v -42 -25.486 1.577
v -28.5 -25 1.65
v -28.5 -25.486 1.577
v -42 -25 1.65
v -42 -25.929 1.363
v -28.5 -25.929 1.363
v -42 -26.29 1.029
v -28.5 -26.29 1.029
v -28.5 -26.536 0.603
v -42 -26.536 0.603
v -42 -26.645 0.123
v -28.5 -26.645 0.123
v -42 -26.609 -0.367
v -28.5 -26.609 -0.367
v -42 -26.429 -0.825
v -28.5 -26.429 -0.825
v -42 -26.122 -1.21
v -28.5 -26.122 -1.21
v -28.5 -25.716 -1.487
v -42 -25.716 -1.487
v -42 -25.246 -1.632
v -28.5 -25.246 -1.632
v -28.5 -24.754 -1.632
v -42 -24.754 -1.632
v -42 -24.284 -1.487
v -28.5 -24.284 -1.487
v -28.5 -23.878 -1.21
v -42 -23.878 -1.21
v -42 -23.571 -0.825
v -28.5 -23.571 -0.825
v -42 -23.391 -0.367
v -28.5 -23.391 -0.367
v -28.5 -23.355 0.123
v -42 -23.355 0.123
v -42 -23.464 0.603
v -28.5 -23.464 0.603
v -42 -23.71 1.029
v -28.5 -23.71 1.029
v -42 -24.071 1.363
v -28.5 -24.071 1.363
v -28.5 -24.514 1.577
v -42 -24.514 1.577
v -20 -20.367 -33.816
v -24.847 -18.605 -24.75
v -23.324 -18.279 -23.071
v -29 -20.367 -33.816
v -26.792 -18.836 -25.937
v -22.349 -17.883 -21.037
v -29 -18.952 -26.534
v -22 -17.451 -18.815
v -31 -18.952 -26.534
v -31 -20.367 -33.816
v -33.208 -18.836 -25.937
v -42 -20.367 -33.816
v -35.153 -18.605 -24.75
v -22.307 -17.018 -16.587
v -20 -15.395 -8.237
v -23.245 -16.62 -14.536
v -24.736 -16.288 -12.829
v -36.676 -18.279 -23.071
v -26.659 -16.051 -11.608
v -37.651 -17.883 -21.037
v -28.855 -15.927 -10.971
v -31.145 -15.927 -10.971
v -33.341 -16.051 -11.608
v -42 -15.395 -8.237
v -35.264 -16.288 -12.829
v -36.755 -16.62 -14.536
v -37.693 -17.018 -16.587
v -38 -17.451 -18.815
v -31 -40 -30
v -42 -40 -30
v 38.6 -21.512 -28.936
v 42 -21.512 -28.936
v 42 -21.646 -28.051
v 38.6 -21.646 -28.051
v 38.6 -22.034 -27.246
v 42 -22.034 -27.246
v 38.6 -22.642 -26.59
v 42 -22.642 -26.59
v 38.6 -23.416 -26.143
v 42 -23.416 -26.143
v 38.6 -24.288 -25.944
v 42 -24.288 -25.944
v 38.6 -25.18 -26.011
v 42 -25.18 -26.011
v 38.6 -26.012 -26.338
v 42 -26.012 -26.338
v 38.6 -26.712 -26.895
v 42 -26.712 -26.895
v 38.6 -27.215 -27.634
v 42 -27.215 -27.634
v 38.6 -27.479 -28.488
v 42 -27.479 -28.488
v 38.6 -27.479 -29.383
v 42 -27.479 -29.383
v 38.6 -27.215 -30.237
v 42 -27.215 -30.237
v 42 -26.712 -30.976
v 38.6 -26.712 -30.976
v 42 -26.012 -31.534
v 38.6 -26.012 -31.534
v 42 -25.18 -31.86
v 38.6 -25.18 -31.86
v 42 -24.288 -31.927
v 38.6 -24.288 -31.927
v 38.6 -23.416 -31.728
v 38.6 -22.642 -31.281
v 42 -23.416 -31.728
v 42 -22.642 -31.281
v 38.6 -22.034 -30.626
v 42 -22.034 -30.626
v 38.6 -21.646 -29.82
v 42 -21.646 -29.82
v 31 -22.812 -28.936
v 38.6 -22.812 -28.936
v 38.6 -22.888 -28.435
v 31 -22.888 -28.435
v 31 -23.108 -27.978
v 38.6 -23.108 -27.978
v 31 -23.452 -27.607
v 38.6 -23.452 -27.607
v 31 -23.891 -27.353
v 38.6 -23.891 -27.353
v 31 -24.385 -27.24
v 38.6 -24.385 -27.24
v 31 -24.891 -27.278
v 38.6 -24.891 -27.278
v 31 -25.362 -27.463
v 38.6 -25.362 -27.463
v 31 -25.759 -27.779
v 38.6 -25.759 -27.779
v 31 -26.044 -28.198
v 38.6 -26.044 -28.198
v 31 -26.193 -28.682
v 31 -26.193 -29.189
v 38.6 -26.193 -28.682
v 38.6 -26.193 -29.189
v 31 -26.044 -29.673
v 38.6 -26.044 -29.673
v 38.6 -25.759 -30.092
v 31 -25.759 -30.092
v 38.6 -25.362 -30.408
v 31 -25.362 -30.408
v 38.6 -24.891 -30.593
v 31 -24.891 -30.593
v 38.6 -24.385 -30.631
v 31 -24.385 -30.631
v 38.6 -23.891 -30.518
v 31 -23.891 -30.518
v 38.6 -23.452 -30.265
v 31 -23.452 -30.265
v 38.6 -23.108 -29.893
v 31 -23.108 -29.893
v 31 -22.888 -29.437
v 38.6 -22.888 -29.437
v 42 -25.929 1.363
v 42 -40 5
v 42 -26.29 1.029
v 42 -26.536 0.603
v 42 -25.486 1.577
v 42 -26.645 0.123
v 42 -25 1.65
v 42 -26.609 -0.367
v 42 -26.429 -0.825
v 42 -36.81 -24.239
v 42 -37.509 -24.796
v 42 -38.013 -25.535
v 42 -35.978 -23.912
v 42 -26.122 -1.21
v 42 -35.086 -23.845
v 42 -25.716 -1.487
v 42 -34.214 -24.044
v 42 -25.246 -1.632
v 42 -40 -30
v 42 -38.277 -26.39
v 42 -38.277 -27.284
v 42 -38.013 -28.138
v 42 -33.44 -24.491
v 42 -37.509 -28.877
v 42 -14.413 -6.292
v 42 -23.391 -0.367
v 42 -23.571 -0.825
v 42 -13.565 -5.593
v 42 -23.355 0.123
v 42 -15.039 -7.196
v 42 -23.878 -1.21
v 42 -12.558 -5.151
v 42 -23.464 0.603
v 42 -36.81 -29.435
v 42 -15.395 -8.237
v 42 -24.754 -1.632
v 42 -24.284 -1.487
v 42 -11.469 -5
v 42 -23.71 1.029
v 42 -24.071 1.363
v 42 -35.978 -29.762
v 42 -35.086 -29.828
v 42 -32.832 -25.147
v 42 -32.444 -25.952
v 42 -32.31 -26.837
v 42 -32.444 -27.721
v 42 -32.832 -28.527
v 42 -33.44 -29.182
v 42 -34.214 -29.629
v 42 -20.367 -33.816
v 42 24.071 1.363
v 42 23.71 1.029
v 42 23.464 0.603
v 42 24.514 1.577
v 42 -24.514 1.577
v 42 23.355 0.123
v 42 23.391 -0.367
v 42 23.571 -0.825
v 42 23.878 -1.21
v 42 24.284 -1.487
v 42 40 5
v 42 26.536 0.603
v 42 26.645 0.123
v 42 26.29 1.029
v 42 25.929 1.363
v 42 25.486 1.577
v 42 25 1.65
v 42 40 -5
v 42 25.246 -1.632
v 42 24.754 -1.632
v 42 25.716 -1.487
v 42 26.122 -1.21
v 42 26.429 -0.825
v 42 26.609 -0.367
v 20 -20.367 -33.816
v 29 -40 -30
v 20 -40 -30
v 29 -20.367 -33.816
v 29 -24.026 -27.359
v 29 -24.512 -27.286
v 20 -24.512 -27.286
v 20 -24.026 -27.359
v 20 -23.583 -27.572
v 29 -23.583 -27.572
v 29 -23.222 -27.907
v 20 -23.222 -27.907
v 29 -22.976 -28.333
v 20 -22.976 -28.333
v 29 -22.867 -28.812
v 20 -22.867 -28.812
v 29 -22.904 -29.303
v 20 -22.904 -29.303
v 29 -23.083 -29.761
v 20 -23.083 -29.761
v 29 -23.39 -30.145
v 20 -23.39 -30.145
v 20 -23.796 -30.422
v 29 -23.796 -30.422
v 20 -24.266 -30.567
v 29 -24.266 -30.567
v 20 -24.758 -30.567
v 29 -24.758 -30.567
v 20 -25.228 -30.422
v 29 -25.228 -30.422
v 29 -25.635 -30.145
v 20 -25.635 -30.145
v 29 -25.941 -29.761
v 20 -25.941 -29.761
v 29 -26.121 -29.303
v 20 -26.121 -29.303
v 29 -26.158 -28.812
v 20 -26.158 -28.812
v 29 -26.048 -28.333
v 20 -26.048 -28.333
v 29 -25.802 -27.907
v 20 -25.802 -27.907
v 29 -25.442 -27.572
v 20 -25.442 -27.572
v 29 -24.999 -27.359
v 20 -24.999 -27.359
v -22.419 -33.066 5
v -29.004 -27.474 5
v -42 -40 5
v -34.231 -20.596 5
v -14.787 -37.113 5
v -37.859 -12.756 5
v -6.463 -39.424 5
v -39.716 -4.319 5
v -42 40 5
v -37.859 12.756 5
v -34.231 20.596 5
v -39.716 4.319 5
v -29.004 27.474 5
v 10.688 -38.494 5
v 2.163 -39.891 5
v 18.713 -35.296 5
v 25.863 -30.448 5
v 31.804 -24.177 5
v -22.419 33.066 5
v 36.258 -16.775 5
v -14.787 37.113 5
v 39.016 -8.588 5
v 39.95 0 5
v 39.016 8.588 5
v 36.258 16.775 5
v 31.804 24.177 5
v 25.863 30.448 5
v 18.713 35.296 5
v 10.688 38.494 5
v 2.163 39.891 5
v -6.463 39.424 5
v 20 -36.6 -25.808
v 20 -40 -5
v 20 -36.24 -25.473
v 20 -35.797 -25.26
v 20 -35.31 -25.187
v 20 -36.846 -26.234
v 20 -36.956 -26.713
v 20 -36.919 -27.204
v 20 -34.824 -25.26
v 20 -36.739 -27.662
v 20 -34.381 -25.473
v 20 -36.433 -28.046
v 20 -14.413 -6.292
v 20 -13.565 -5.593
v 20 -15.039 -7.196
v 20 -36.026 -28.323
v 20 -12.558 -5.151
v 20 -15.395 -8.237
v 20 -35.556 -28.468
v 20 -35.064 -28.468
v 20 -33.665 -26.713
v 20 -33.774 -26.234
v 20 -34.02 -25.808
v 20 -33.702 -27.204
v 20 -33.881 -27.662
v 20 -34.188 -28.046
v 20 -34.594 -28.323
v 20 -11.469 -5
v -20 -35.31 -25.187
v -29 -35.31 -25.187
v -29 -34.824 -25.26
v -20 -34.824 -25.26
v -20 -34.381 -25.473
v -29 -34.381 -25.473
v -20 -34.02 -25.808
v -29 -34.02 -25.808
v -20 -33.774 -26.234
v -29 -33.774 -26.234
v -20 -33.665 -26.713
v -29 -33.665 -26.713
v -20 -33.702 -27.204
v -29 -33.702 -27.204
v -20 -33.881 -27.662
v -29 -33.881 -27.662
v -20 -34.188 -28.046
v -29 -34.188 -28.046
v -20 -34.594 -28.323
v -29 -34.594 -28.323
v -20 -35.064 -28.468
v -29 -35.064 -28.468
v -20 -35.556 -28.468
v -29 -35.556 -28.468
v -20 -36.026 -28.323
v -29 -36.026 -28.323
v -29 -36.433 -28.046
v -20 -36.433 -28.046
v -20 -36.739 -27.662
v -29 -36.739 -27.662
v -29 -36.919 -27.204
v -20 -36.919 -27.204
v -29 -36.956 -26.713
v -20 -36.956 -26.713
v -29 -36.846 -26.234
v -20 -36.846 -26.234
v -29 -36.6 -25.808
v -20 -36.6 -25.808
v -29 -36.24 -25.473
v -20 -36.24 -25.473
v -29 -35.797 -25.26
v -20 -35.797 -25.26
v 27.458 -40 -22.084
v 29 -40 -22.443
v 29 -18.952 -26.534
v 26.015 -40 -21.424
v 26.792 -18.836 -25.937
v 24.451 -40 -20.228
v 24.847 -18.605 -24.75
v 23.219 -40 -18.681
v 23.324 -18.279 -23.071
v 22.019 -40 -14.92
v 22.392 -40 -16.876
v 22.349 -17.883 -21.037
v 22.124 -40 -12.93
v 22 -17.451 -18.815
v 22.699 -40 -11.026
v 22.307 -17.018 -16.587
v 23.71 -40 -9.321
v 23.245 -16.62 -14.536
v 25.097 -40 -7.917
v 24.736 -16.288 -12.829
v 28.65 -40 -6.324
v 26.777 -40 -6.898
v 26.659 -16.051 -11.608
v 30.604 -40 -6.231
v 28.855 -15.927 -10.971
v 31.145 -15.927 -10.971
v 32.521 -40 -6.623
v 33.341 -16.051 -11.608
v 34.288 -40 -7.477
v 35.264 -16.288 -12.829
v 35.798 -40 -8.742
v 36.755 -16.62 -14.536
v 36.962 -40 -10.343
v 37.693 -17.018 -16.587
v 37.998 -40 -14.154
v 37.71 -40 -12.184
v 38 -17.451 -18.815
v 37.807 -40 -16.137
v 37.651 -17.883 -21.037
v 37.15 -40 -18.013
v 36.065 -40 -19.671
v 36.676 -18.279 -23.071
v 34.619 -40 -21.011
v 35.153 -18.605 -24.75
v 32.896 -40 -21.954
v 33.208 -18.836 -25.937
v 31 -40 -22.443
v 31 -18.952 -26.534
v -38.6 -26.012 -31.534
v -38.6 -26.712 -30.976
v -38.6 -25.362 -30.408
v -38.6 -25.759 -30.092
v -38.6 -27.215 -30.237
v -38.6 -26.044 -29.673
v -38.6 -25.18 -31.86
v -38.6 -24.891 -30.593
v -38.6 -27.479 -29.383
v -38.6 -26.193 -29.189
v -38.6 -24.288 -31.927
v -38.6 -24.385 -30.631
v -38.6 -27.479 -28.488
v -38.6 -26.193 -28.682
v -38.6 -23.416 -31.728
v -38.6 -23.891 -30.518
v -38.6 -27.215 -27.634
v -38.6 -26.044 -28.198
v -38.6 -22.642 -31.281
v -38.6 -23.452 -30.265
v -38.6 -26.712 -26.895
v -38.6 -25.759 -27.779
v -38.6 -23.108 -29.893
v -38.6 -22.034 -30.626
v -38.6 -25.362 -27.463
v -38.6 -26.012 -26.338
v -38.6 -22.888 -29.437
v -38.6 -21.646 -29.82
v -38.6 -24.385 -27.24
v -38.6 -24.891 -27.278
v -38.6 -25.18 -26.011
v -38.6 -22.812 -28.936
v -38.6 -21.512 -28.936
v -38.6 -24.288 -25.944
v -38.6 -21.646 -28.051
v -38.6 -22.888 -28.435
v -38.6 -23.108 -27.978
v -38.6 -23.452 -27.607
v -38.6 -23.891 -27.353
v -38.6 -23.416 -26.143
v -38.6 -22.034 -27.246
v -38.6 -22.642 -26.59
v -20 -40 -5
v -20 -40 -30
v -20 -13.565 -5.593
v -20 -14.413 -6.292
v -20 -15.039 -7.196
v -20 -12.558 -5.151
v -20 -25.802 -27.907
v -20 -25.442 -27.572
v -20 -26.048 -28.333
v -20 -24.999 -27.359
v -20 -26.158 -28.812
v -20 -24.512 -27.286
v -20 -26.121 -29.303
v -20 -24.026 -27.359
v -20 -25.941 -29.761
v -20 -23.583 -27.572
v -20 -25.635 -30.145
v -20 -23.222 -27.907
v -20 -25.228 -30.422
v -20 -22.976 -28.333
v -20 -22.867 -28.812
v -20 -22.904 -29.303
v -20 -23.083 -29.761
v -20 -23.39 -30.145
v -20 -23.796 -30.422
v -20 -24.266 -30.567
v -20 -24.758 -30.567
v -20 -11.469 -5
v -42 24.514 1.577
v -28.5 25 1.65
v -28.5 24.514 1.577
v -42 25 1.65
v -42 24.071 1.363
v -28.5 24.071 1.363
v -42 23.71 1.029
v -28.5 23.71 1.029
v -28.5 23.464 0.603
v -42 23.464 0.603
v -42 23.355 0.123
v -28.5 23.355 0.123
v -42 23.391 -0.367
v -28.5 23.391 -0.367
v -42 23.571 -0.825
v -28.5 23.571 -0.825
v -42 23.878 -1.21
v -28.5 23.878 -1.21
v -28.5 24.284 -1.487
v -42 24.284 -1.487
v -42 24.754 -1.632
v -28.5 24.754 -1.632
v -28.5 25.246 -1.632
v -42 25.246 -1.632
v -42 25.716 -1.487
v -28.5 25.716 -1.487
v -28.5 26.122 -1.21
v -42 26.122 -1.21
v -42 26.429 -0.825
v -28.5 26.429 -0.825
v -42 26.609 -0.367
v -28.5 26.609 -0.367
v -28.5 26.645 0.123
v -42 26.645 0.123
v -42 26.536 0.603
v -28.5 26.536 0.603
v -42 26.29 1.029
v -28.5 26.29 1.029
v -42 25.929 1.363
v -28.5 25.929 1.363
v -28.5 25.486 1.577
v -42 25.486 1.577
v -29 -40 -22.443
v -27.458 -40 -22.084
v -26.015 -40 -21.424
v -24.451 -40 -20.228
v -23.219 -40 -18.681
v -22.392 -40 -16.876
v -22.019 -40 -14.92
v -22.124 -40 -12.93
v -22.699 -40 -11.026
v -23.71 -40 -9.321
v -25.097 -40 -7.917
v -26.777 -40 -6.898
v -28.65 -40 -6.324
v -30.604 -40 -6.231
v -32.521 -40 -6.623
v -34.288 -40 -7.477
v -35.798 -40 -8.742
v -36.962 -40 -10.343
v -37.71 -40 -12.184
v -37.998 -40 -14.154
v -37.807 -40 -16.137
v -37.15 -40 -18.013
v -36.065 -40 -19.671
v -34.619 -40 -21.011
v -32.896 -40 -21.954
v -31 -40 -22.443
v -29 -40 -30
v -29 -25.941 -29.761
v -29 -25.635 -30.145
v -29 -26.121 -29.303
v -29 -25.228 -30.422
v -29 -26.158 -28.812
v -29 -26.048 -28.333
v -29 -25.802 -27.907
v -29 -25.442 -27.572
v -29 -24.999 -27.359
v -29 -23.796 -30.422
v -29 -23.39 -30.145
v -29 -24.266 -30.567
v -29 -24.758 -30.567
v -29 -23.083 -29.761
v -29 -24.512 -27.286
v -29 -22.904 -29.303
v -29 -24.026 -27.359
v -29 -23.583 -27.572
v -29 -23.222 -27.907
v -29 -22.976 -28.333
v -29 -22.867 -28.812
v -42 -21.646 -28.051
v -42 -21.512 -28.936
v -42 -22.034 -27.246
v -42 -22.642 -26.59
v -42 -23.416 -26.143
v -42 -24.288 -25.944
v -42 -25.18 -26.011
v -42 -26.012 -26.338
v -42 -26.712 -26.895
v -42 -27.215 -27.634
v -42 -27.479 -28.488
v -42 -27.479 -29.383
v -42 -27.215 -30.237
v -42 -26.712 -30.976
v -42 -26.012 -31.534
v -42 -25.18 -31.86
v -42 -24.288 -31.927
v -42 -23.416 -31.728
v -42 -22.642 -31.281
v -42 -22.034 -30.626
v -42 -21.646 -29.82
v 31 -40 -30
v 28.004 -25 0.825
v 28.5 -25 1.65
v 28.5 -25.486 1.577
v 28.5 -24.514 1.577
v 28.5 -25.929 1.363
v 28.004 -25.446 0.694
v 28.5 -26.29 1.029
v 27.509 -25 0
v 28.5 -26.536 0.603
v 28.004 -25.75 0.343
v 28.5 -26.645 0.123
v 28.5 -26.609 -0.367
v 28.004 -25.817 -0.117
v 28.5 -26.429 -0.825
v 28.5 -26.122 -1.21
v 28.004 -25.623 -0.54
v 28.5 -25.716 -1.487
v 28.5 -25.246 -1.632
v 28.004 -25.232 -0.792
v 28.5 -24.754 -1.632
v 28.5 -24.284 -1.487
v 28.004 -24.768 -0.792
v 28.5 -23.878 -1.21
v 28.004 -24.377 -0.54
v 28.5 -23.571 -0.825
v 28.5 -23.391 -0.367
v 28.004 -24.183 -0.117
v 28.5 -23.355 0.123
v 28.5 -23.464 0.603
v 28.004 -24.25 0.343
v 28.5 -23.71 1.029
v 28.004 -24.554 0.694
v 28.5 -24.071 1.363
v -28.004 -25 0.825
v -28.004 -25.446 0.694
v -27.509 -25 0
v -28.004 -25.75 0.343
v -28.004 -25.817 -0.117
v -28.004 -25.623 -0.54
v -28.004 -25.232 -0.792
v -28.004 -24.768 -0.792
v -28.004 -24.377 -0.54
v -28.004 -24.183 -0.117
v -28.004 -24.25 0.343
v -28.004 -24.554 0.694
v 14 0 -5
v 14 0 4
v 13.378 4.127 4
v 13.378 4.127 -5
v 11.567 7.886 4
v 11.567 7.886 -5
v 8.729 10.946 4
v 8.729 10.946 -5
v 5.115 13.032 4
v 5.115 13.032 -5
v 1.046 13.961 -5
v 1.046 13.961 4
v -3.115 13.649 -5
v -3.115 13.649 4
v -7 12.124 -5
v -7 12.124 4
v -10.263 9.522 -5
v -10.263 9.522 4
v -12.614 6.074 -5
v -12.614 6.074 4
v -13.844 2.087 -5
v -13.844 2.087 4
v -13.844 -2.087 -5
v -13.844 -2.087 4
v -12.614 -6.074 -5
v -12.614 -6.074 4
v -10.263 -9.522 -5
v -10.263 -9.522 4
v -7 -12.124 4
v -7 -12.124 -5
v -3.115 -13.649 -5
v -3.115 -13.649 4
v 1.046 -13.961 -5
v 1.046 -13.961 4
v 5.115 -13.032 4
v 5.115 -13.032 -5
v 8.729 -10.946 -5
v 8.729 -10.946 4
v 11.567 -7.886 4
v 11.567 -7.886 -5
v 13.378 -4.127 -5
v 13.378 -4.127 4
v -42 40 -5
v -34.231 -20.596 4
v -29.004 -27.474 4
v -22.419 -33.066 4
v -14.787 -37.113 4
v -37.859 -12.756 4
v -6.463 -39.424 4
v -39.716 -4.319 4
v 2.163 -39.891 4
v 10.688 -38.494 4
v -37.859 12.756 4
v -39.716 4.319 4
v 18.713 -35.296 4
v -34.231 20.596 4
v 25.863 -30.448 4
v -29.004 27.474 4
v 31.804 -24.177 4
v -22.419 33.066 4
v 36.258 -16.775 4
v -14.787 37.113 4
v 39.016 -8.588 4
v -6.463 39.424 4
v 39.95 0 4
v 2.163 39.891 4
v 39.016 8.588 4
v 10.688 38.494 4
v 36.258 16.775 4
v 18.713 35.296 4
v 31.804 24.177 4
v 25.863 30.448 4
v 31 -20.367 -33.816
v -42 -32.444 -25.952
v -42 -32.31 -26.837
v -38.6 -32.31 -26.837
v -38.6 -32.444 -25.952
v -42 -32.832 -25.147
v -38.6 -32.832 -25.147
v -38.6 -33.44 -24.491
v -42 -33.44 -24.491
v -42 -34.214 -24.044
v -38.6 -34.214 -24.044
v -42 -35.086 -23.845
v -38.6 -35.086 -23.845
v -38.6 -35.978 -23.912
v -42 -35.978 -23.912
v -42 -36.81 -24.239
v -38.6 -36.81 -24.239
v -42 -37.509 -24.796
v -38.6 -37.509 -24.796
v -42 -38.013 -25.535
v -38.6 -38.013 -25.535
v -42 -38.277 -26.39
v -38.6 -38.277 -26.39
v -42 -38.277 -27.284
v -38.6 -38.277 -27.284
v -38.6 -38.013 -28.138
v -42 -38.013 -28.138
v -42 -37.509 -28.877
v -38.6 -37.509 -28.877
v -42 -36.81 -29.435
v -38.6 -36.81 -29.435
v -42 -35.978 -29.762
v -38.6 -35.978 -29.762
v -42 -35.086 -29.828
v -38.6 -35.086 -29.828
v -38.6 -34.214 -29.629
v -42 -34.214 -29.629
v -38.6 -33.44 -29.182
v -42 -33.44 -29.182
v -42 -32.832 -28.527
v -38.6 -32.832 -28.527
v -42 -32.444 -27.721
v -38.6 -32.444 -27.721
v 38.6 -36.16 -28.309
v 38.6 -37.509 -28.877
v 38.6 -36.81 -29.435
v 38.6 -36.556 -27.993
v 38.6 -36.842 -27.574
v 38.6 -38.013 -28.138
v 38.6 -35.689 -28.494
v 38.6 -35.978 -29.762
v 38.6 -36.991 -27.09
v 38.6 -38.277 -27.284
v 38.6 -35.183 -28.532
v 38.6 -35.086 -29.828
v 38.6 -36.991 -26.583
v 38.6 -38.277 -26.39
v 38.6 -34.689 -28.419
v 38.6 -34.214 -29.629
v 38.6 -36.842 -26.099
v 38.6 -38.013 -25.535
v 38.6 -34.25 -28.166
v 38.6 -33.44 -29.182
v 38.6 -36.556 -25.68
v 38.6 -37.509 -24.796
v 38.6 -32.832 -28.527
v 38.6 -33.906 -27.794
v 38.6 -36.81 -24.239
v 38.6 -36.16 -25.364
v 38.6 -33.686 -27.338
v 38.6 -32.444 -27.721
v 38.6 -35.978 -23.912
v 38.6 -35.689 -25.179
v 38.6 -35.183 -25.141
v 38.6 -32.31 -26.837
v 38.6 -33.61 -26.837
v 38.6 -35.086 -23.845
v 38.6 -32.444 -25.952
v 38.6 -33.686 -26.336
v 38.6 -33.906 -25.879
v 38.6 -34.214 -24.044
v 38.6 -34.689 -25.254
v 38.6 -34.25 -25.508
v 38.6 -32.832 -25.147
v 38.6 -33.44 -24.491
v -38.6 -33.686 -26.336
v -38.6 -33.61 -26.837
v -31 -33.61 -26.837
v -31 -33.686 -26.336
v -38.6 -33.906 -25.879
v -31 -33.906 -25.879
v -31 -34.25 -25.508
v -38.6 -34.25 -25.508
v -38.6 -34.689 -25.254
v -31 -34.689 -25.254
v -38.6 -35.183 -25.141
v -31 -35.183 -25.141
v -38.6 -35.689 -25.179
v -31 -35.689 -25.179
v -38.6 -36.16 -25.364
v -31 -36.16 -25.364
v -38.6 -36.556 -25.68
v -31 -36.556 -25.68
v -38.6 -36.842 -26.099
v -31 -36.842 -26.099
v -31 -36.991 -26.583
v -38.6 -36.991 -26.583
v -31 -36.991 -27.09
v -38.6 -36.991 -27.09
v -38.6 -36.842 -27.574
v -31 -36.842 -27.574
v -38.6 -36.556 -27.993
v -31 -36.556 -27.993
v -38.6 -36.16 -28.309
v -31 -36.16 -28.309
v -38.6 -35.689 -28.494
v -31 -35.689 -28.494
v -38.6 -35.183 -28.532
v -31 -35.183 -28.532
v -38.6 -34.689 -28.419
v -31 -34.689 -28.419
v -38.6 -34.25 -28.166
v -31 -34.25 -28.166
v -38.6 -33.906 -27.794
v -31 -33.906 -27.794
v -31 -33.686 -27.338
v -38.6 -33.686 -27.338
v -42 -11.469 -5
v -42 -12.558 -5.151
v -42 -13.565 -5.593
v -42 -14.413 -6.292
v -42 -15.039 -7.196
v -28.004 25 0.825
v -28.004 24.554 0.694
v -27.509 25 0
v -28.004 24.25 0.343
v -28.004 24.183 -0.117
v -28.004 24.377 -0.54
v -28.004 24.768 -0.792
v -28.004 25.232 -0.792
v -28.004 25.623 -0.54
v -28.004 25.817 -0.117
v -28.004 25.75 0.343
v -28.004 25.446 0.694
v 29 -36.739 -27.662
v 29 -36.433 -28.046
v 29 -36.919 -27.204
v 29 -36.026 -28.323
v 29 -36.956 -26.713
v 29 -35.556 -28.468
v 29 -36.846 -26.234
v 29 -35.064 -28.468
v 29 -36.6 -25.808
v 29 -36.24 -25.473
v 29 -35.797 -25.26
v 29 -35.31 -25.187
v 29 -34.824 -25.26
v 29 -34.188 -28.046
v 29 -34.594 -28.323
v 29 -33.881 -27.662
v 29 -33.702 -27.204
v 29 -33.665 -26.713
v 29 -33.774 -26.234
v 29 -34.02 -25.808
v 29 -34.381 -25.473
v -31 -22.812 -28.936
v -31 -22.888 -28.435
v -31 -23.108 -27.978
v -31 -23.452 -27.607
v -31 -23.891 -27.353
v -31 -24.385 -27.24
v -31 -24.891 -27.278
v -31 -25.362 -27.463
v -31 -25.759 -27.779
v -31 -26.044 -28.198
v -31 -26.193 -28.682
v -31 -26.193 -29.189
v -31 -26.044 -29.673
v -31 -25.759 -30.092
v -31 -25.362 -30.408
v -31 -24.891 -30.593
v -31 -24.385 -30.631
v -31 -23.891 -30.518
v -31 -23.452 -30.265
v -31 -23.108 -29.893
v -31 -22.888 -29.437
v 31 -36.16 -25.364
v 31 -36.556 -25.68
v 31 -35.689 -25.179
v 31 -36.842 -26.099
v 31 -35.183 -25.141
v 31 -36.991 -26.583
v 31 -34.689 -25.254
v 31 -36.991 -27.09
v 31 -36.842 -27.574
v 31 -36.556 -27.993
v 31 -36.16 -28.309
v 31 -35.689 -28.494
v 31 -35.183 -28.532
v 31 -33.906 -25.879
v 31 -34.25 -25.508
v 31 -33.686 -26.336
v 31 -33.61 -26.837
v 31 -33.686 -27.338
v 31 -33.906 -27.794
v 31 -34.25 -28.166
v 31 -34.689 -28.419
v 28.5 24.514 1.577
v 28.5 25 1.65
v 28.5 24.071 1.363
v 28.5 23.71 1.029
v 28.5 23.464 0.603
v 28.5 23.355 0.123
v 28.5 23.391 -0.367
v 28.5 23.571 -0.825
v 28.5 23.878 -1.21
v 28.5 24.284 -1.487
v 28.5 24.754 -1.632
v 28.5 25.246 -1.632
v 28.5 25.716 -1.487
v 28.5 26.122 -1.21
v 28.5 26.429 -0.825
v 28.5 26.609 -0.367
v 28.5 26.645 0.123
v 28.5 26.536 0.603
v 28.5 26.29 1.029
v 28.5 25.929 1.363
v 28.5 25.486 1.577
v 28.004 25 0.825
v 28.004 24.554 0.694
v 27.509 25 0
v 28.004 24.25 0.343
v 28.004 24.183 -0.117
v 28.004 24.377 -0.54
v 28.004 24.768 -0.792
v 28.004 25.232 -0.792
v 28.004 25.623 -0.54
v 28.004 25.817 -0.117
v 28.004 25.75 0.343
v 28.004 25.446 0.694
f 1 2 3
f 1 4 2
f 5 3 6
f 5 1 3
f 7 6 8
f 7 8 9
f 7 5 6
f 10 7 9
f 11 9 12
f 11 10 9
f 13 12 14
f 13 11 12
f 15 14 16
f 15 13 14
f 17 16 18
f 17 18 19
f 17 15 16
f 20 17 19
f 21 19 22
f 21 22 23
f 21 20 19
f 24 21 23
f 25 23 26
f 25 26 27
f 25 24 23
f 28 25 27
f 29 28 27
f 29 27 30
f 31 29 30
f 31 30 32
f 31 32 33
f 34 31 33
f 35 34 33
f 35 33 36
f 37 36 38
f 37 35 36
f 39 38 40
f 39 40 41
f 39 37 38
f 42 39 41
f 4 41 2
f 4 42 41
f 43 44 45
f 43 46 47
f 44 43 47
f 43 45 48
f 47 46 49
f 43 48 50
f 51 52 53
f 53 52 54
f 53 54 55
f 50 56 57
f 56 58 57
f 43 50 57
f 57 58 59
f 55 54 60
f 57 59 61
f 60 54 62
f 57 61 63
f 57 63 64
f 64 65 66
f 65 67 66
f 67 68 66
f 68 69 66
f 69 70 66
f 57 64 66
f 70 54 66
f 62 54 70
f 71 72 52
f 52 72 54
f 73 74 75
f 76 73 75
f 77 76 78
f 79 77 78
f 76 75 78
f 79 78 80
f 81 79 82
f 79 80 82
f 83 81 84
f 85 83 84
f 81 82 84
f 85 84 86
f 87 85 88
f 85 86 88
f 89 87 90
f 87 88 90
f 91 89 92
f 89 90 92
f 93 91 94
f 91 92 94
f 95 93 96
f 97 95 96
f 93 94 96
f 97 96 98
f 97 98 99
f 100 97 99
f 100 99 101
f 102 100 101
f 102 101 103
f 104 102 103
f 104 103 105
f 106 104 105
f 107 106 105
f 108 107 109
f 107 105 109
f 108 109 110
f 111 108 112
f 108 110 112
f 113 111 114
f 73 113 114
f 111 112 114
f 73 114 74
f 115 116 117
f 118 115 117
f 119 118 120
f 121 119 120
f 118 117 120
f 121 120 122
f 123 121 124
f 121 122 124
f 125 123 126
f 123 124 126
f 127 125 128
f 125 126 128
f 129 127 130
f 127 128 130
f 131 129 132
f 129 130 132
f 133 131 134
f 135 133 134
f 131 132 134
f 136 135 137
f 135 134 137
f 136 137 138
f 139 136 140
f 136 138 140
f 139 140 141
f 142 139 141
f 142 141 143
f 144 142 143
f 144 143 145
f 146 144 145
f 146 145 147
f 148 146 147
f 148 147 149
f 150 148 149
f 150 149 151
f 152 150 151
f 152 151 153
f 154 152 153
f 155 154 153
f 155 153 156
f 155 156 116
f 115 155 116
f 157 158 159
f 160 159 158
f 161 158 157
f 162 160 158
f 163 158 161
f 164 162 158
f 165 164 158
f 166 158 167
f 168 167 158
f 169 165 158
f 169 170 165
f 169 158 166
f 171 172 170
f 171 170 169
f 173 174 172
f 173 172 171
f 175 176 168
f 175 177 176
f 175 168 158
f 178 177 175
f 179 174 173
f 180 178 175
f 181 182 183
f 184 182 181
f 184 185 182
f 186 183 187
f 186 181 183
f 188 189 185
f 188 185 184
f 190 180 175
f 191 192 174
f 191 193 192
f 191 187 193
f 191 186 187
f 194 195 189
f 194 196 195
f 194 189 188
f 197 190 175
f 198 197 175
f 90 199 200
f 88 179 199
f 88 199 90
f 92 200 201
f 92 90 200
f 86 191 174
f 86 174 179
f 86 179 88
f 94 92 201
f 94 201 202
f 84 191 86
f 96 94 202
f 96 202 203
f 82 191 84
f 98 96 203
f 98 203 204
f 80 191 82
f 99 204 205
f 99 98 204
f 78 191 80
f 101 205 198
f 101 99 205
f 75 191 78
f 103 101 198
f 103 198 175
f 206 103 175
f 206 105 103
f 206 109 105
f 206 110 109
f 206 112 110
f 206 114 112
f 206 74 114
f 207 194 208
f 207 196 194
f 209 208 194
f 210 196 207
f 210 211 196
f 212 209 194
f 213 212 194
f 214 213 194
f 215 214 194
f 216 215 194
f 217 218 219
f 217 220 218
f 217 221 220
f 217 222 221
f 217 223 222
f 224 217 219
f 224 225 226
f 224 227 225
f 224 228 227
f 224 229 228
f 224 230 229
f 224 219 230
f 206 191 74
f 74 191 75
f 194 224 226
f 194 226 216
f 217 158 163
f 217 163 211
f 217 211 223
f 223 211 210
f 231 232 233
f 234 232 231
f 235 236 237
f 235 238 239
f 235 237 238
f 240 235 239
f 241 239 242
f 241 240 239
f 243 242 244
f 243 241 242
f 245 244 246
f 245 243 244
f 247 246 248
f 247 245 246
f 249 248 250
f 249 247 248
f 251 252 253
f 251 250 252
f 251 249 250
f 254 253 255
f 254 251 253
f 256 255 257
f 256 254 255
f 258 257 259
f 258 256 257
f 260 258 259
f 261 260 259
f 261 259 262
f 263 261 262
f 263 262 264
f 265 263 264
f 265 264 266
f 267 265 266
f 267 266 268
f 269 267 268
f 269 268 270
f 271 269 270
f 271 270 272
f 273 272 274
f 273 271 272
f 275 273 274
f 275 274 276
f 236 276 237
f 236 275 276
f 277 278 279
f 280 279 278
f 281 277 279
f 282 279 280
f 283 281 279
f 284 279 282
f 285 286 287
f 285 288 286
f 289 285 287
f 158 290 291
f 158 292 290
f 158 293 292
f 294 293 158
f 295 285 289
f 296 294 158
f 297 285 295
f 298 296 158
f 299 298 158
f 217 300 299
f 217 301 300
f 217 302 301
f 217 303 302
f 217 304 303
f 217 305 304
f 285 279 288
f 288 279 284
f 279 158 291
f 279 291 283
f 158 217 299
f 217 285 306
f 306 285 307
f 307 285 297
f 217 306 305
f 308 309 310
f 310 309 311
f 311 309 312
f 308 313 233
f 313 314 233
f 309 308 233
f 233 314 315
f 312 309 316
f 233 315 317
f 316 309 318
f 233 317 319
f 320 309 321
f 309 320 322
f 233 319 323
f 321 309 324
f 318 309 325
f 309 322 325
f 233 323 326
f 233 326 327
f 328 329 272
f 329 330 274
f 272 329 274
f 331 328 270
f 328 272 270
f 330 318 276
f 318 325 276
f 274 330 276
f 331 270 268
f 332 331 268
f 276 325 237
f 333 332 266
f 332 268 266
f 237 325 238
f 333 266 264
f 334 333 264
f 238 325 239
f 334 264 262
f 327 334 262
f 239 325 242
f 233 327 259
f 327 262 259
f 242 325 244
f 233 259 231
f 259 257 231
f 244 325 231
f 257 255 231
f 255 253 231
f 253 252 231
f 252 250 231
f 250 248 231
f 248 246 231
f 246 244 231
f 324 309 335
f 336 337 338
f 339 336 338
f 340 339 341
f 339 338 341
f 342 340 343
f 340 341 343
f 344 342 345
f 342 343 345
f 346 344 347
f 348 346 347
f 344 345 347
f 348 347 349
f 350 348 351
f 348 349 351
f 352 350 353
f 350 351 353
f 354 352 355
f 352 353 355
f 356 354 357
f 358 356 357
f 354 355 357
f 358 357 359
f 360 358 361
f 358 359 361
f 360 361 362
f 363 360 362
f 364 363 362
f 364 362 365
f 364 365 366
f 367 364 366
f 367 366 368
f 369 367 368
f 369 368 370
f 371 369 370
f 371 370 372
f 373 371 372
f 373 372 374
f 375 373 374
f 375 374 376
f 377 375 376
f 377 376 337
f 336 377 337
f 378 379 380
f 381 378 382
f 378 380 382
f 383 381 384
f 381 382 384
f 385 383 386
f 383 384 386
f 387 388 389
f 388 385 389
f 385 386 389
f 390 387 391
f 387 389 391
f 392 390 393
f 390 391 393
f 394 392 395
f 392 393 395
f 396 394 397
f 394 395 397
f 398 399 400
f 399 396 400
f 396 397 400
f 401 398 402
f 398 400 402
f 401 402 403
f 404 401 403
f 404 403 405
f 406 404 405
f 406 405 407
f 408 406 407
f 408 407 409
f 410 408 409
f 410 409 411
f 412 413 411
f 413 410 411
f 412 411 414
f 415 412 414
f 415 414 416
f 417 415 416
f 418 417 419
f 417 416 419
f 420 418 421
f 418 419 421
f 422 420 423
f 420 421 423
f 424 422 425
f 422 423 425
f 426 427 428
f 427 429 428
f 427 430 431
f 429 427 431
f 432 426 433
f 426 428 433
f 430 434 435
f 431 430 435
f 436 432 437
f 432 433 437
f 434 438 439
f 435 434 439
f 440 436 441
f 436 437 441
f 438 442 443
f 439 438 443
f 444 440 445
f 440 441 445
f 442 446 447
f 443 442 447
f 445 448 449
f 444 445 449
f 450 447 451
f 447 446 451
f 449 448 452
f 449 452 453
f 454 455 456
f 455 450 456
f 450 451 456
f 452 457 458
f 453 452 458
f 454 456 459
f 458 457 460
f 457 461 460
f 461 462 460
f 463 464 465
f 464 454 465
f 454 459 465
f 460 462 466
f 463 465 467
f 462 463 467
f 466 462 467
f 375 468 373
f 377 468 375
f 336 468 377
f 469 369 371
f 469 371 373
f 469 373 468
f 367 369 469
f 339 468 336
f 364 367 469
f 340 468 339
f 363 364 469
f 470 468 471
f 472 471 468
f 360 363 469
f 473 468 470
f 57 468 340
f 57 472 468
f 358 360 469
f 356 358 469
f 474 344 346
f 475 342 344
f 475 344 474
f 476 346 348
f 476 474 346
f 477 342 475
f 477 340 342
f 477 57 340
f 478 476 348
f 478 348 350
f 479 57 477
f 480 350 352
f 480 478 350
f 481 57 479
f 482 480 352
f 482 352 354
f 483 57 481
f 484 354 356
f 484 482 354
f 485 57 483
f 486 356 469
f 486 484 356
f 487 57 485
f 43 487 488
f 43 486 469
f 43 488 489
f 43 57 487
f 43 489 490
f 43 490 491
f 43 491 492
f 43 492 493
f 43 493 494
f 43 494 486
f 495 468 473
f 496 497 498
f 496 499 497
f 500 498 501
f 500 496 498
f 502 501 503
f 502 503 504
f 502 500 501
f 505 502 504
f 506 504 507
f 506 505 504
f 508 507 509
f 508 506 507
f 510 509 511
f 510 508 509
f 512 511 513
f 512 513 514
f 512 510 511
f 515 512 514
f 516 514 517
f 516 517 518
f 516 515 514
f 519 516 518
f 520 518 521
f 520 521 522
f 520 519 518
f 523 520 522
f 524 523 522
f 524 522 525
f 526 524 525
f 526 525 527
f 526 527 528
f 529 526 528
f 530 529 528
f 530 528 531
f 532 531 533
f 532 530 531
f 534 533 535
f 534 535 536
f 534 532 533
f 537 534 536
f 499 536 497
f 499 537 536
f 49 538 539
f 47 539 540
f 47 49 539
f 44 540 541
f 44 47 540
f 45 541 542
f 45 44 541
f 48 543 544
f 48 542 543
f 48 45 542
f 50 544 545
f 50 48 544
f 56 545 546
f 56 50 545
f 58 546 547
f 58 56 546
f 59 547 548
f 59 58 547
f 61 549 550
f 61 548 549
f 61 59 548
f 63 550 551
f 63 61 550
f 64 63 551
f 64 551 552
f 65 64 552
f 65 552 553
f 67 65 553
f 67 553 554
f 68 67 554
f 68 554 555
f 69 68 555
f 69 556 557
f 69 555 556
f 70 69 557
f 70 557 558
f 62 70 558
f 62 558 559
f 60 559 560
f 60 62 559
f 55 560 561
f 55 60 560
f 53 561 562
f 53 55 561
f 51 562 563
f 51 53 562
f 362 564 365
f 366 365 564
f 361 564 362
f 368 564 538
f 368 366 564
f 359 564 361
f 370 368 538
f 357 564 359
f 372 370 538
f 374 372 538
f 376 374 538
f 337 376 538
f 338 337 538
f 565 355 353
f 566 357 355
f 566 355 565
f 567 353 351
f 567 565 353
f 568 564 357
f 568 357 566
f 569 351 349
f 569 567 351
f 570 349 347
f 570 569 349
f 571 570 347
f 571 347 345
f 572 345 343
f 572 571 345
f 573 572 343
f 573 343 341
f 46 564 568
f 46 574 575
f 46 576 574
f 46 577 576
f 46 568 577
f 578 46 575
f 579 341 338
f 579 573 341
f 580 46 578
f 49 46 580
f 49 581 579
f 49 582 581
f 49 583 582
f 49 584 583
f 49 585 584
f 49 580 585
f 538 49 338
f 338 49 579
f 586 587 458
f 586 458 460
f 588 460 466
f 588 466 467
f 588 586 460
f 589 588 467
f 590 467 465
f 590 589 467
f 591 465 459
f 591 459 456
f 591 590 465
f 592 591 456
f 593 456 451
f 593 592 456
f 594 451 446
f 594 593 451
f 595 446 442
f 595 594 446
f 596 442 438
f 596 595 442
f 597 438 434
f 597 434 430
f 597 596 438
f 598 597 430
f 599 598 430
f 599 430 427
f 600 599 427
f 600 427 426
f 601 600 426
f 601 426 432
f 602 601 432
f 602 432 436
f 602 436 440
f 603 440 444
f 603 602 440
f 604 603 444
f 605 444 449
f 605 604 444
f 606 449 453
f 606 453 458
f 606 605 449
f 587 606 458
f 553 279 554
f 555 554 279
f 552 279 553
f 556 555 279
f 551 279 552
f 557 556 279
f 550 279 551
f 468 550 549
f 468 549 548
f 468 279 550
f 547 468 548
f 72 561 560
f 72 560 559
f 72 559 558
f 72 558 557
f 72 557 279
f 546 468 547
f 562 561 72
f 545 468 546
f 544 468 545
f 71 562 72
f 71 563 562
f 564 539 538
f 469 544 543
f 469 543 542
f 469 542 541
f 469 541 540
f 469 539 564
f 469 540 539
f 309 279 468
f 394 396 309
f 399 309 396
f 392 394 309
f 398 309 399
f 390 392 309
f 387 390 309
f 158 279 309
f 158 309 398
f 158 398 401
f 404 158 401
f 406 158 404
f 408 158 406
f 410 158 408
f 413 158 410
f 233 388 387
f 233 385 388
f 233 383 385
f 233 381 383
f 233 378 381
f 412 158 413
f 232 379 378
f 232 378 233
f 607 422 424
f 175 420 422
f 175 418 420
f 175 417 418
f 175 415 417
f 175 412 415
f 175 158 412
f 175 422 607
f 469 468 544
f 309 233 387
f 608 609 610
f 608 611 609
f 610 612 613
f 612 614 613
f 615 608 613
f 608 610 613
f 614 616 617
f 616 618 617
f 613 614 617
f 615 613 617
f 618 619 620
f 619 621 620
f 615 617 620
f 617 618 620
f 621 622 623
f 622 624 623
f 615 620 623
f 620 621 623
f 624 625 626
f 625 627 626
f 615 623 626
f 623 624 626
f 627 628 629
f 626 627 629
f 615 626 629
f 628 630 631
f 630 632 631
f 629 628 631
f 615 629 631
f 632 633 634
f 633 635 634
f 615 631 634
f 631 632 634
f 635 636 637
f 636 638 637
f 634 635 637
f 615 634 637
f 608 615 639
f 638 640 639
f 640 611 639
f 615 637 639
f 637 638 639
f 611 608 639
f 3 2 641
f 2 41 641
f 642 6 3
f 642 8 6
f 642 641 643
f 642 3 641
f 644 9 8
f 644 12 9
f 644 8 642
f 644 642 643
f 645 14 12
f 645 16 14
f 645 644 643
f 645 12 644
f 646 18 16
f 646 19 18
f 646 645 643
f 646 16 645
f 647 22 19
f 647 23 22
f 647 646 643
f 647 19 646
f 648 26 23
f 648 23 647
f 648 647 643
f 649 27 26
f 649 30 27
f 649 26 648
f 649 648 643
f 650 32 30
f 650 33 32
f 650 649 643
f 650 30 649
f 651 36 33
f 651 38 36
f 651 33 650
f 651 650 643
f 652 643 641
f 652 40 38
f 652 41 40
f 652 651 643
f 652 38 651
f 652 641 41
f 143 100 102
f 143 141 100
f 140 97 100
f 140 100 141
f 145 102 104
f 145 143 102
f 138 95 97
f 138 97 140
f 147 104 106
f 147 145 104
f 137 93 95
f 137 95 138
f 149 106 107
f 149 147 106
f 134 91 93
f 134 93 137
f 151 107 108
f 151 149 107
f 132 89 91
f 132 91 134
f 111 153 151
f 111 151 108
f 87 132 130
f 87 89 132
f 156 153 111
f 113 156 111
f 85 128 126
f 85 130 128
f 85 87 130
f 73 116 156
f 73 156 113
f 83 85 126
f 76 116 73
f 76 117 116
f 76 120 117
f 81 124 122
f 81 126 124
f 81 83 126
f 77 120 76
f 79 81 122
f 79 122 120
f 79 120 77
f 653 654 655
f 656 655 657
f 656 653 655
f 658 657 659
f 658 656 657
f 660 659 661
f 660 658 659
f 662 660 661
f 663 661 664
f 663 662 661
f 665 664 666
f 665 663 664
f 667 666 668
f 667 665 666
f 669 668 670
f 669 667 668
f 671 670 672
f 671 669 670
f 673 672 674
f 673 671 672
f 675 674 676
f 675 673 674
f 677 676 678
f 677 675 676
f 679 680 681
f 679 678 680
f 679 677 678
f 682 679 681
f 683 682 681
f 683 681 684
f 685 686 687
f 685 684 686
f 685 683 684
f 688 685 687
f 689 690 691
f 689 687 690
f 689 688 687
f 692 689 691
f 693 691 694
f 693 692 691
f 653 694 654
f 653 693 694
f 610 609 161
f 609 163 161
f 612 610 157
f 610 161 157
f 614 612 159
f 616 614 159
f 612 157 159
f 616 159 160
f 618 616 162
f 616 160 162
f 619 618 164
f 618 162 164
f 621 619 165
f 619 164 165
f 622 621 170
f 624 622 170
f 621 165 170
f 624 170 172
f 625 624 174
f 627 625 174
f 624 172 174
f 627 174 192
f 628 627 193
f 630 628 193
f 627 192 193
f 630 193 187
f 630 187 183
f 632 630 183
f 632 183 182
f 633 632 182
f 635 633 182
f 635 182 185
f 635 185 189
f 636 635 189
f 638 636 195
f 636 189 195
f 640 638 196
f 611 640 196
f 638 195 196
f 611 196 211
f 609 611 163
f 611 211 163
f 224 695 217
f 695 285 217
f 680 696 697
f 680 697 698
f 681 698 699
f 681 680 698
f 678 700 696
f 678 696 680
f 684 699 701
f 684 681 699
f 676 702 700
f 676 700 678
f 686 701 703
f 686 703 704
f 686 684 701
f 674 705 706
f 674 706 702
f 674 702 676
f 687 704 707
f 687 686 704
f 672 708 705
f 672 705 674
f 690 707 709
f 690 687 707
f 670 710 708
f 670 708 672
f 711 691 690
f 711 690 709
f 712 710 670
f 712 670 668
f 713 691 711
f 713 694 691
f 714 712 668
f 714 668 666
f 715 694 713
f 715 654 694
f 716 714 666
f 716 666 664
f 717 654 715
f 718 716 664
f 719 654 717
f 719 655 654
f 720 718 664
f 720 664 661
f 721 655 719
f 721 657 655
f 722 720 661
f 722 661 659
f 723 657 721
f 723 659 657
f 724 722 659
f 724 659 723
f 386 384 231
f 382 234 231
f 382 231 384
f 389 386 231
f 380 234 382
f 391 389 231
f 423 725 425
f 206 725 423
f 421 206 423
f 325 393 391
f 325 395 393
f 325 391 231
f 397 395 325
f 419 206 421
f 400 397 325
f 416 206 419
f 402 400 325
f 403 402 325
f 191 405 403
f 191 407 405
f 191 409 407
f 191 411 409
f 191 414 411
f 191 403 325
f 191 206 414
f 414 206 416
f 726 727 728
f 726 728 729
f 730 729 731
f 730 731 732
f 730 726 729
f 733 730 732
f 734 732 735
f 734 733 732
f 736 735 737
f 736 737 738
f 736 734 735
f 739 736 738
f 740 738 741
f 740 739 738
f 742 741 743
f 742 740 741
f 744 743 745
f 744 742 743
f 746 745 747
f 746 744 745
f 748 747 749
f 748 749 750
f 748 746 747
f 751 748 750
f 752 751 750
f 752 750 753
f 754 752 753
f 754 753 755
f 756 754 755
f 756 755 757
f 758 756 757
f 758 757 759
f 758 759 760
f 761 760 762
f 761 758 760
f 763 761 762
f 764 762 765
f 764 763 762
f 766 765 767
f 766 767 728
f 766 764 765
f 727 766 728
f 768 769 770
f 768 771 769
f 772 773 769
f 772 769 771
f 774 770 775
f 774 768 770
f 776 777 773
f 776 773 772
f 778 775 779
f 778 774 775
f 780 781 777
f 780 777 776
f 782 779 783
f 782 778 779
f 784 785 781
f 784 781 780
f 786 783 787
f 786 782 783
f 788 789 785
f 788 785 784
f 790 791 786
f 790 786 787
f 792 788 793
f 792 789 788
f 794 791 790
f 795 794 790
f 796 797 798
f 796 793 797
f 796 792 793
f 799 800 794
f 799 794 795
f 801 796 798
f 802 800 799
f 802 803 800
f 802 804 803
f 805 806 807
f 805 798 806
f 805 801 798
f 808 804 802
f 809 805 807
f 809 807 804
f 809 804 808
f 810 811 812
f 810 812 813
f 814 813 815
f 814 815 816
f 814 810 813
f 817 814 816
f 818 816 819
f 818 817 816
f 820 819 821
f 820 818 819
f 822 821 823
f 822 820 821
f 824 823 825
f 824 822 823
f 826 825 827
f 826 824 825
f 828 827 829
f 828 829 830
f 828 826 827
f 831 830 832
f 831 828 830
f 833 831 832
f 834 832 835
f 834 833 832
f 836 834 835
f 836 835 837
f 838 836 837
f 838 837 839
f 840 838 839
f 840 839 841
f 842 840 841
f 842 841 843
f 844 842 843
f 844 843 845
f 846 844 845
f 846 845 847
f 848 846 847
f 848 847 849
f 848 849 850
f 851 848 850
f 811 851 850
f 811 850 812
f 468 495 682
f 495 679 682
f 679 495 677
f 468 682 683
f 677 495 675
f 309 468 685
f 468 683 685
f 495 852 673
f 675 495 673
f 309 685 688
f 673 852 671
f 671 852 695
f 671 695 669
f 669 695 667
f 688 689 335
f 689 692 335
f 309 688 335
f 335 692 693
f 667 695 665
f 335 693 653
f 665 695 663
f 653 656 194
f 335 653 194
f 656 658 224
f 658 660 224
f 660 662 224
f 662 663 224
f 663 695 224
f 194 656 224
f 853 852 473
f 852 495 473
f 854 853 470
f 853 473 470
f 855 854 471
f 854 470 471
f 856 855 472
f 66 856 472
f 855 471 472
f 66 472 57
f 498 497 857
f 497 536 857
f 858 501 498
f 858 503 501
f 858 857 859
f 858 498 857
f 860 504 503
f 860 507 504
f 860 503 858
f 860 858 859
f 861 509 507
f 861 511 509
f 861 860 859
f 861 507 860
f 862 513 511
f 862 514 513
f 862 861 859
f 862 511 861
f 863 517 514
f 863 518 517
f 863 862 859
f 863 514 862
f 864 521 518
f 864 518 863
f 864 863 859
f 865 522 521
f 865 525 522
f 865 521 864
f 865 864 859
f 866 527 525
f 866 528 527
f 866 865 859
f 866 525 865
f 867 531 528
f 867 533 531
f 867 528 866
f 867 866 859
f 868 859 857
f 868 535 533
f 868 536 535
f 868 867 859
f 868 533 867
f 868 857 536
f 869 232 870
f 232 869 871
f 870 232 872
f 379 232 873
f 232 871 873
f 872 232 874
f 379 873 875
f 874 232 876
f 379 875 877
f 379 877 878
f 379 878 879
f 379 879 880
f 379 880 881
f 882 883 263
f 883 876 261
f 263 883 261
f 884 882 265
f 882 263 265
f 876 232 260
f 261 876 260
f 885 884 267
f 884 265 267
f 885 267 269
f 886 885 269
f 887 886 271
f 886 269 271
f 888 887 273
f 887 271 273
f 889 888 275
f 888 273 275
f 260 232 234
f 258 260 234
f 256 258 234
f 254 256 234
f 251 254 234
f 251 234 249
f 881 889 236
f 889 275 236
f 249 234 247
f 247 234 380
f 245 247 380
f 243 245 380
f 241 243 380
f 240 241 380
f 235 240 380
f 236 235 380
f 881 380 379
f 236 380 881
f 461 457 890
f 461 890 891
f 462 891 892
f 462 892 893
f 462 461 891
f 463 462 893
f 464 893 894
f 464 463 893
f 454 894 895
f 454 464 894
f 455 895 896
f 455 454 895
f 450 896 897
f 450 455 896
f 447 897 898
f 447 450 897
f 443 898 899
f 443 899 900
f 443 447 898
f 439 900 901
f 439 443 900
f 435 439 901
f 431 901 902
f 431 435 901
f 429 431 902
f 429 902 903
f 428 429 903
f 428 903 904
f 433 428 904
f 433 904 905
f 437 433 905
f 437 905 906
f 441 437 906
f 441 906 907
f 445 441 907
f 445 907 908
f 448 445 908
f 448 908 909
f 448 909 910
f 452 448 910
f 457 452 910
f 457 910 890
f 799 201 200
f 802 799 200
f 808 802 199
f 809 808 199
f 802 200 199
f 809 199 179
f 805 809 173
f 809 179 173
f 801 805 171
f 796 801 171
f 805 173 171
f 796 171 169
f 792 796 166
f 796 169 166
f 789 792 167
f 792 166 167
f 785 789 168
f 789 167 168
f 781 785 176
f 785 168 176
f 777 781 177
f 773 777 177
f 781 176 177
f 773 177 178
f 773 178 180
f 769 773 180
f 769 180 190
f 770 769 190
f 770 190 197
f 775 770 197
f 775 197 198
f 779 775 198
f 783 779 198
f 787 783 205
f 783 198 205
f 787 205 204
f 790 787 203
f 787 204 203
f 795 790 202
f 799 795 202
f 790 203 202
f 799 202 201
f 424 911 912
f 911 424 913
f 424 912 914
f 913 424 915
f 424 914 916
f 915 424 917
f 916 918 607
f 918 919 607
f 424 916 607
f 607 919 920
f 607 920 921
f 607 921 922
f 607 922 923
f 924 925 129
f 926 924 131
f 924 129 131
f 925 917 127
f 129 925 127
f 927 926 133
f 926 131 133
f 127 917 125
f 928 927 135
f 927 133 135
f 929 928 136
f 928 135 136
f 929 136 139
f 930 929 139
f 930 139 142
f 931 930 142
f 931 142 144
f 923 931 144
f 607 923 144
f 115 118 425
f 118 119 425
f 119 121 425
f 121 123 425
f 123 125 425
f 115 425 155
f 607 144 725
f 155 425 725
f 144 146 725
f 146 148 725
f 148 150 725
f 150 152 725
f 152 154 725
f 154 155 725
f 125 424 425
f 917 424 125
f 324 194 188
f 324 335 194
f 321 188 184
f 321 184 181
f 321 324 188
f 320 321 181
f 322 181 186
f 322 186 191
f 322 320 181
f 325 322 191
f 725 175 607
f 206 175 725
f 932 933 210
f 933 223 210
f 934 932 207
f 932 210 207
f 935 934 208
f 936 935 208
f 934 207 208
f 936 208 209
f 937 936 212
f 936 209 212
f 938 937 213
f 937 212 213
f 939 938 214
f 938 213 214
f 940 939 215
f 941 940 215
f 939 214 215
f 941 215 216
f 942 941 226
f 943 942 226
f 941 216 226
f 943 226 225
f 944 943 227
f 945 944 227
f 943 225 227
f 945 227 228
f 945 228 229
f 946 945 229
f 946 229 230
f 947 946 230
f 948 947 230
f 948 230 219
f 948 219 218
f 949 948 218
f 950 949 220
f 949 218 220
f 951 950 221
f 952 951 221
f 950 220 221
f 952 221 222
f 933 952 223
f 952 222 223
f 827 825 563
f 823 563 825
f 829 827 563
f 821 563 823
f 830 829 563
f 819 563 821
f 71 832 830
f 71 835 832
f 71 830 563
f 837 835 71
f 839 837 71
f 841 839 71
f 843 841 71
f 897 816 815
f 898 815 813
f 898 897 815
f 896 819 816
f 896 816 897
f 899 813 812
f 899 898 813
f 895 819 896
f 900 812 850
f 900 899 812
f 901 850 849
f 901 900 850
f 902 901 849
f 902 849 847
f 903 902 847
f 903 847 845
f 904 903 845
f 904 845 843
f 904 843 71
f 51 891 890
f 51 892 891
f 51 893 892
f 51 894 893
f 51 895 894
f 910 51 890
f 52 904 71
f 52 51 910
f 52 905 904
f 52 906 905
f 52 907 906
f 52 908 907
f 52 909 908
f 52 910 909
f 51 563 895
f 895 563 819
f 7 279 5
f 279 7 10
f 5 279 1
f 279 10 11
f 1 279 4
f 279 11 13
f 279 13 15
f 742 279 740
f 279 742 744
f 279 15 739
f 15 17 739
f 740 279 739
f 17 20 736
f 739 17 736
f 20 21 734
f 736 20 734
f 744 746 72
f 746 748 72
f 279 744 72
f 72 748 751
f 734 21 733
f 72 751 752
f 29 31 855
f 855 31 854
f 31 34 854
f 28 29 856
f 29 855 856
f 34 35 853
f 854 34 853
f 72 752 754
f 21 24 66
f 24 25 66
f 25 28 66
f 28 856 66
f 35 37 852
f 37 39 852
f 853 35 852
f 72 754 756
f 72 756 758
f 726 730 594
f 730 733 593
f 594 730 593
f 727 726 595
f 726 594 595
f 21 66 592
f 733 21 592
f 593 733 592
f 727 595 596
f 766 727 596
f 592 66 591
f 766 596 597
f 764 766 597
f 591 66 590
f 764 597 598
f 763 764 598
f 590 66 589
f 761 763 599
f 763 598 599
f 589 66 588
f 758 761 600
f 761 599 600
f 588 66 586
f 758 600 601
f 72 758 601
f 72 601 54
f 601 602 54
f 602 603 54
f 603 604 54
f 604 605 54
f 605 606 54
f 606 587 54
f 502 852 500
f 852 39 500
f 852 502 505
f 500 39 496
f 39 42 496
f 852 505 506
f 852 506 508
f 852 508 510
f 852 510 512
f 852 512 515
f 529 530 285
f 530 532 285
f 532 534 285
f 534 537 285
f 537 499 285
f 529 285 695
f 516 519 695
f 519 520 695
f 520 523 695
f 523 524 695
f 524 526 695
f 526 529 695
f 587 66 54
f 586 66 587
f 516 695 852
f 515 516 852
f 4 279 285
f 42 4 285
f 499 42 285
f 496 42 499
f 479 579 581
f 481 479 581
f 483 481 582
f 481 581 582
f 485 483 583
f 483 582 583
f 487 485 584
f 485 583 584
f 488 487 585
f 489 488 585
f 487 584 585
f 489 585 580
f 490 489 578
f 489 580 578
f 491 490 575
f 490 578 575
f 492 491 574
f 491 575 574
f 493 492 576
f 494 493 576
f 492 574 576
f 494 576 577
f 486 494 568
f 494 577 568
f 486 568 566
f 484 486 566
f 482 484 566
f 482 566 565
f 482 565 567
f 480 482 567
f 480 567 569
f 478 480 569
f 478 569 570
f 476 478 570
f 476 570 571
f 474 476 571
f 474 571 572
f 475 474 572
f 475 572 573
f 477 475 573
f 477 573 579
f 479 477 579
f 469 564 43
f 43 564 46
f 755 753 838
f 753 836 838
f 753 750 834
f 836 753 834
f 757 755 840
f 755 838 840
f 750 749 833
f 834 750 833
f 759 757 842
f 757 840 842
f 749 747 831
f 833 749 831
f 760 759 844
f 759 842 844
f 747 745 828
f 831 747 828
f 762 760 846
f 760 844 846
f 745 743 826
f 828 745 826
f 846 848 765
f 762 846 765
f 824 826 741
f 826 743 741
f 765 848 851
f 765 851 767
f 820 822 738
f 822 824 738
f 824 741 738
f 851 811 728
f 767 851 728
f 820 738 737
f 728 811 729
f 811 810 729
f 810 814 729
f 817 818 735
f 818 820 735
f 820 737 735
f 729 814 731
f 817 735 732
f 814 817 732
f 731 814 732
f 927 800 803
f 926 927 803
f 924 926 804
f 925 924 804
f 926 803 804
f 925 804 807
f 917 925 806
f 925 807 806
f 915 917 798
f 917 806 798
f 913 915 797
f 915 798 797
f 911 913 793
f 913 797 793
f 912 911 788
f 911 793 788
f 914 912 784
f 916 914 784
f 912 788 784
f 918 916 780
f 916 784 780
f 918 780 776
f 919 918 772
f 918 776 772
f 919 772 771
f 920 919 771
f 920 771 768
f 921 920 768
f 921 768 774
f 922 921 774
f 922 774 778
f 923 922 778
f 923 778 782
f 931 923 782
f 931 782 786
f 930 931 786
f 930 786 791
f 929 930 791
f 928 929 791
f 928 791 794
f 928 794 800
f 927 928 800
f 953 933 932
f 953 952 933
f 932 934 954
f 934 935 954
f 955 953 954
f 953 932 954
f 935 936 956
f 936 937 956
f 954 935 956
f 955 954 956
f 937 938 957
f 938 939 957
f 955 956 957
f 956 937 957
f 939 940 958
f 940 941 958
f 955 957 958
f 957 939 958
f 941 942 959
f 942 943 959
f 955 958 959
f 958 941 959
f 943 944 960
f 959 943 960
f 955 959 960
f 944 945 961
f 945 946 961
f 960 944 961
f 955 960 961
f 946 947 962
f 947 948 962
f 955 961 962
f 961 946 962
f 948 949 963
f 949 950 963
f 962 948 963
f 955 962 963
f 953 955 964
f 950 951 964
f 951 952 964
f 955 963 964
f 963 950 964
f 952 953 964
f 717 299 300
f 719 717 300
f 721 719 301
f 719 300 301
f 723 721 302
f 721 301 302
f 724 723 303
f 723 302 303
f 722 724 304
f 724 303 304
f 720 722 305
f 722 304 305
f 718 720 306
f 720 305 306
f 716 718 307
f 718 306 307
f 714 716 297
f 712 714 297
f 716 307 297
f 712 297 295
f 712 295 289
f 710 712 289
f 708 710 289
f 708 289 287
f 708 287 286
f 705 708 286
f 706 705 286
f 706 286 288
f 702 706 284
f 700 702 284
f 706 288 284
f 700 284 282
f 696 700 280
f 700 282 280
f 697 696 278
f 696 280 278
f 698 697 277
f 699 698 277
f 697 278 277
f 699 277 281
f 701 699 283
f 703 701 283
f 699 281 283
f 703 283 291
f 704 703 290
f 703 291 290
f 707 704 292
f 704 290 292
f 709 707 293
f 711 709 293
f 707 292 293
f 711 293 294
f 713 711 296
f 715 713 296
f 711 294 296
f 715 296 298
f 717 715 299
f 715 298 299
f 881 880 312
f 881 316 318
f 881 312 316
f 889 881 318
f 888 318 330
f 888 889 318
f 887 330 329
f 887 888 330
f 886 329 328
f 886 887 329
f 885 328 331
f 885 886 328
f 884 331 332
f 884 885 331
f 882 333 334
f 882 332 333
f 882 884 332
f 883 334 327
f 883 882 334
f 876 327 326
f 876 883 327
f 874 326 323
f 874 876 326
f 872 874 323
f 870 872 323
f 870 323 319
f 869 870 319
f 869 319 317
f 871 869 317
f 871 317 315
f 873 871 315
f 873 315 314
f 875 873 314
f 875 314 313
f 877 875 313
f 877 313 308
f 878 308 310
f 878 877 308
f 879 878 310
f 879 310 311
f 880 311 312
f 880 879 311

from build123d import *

# Parameters (mm, degrees)
SKETCH_1_W                  = 84
SKETCH_1_H                  = 80
SKETCH_1_R                  = 14
EXTRUDE_1_DEPTH             = 5
HOLE_WIZARD_M4_1_AT_2_COUNT = 2
HOLE_WIZARD_M4_1_AT_2_PITCH = 50
EXTRUDE_2_DEPTH             = 22
CUT_EXTRUDE_3_REACH         = 79
HOLE_START                  = -42
HOLE_WIZARD_2_OUTLINE_R     = 1.7
HOLE_WIZARD_2_DEPTH         = 11
HOLE_WIZARD_2_2_OUTLINE_R   = 3
HOLE_WIZARD_2_2_OUTLINE_R_2 = 1.7
HOLE_WIZARD_2_2_DEPTH       = 3.4
HOLE_WIZARD_M4_2_D          = 3.3
FILLET_1_R                  = 4
SKETCH_14_R                 = 39.95
CUT_EXTRUDE_6_DEPTH         = 1


# Read off the part's stored shape, not the designer's step: 打孔尺寸(%根据)内六角圆柱头螺钉的类型2
with BuildPart() as part:
    # 草图1 → 凸台-拉伸1 (new, symmetric)
    with BuildSketch(Plane.XY):
        Rectangle(SKETCH_1_W, SKETCH_1_H)
        Circle(SKETCH_1_R, mode=Mode.SUBTRACT)
    extrude(amount=EXTRUDE_1_DEPTH, both=True)

    # 草图4 → M4 螺纹孔1 (revolve, cut)
    with BuildSketch(Plane(origin=(-42, 25, 0), x_dir=(0, 0, 1), z_dir=(0, 1, 0))):
        Polygon((0, 0), (0, 14.491420021), (1.65, 13.5), (1.65, 0), align=None)
    hole_wizard_m4_1 = revolve(axis=Axis((-48.35, 25, 0), (1, 0, 0)), mode=Mode.SUBTRACT)

    # M4 螺纹孔1 at 2: M4 螺纹孔1 ×2
    with Locations(*[(0, -i * HOLE_WIZARD_M4_1_AT_2_PITCH, 0) for i in range(1, HOLE_WIZARD_M4_1_AT_2_COUNT)]):
        add(hole_wizard_m4_1, mode=Mode.SUBTRACT)

    # 草图6 → 凸台-拉伸2 (add)
    with BuildSketch(Plane.ZY.offset(42)):
        Polygon((-5, -14.766158372), (-5, -40), (-30, -40), (-33.816179908, -20.367456331), align=None)
    extrude_2 = extrude(amount=-EXTRUDE_2_DEPTH)

    # 切除-拉伸3: up to this plane
    cut_extrude_3_end = Plane(origin=(-42, -40, 5), z_dir=(0, 1, 0))
    # 草图7 → 切除-拉伸3 (cut, up to the surface)
    with BuildSketch(Plane(origin=(0, -13.292034521, 2.583709779), x_dir=(1, 0, 0), z_dir=(0, 0.9816271834476648, -0.19080899537654153)), mode=Mode.PRIVATE) as cut_extrude_3_sk1:
        with BuildLine():
            Line((-31, 37.081175318), (-29, 37.081175318))
            Line((-29, 37.081175318), (-29, 29.662905695))
            ThreePointArc((-29, 29.662905695), (-30, 13.725651762), (-31, 29.662905695))
            Line((-31, 29.662905695), (-31, 37.081175318))
        make_face()
    cut_extrude_3_tool1 = split(extrude(cut_extrude_3_sk1.sketch, amount=-CUT_EXTRUDE_3_REACH, mode=Mode.PRIVATE), bisect_by=cut_extrude_3_end, keep=Keep.BOTH, mode=Mode.PRIVATE)
    cut_extrude_3 = cut_extrude_3_tool1.solids().sort_by_distance((-30, -17.589666, -19.525688))[0]
    add(cut_extrude_3, mode=Mode.SUBTRACT)

    # 打孔尺寸(%根据)内六角圆柱头螺钉的类型2 outline → 打孔尺寸(%根据)内六角圆柱头螺钉的类型2 (cut)
    with BuildSketch(Plane.YZ.offset(HOLE_START)):
        with Locations((-35.310255285, -26.836727248)):
            Circle(HOLE_WIZARD_2_OUTLINE_R)
        with Locations((-24.512356267, -28.935626197)):
            Circle(HOLE_WIZARD_2_OUTLINE_R)
    hole_wizard_2 = extrude(amount=HOLE_WIZARD_2_DEPTH, mode=Mode.SUBTRACT)

    # Hole Wizard 2 2 outline → Hole Wizard 2 2 (cut)
    # profile 1 of 2: a face of its own
    with BuildSketch(Plane.YZ.offset(HOLE_START)):
        with Locations((-35.310255285, -26.836727248)):
            Circle(HOLE_WIZARD_2_2_OUTLINE_R)
        with Locations((-35.310255285, -26.836727248)):
            Circle(HOLE_WIZARD_2_2_OUTLINE_R_2, mode=Mode.SUBTRACT)
    # profile 2 of 2: a face of its own
    with BuildSketch(Plane.YZ.offset(HOLE_START)):
        with Locations((-24.512356267, -28.935626197)):
            Circle(HOLE_WIZARD_2_2_OUTLINE_R)
        with Locations((-24.512356267, -28.935626197)):
            Circle(HOLE_WIZARD_2_2_OUTLINE_R_2, mode=Mode.SUBTRACT)
    hole_wizard_2_2 = extrude(amount=HOLE_WIZARD_2_2_DEPTH, mode=Mode.SUBTRACT)

    # M4 螺纹孔2 (through all)
    with Locations(Plane(origin=(-20, 0, 0), x_dir=(0, 0, -1), z_dir=(1, 0, 0))):
        with Locations((28.935626197, -24.512356267), (26.836727248, -35.310255285)):
            hole_wizard_m4_2 = Hole(HOLE_WIZARD_M4_2_D / 2)

    # 镜向1: M4 螺纹孔1, 凸台-拉伸2, 切除-拉伸3, 打孔尺寸(%根据)内六角圆柱头螺钉的类型2, Hole Wizard 2 2, M4 螺纹孔2 across plane
    add(hole_wizard_m4_1.mirror(Plane(origin=(0, 0, 0), x_dir=(0, 0, 1), z_dir=(1, 0, 0))), mode=Mode.SUBTRACT)
    add(extrude_2.mirror(Plane(origin=(0, 0, 0), x_dir=(0, 0, 1), z_dir=(1, 0, 0))))
    add(cut_extrude_3.mirror(Plane(origin=(0, 0, 0), x_dir=(0, 0, 1), z_dir=(1, 0, 0))), mode=Mode.SUBTRACT)
    add(hole_wizard_2.mirror(Plane(origin=(0, 0, 0), x_dir=(0, 0, 1), z_dir=(1, 0, 0))), mode=Mode.SUBTRACT)
    add(hole_wizard_2_2.mirror(Plane(origin=(0, 0, 0), x_dir=(0, 0, 1), z_dir=(1, 0, 0))), mode=Mode.SUBTRACT)
    add(hole_wizard_m4_2.mirror(Plane(origin=(0, 0, 0), x_dir=(0, 0, 1), z_dir=(1, 0, 0))), mode=Mode.SUBTRACT)

    # 镜向1 copy 1 sketch → 镜向1 copy 1 (revolve, cut)
    with BuildSketch(Plane(origin=(42, -25, 0), x_dir=(0, 0, 1), z_dir=(0, 1, 0))):
        Polygon((0, 0), (0, -14.491420021), (1.65, -13.5), (1.65, 0), align=None)
    revolve(axis=Axis((48.35, -25, 0), (1, 0, 0)), mode=Mode.SUBTRACT)

    # 圆角1
    fillet_1_edges = [part.edges().sort_by_distance(p)[0] for p in [
        (-31, -14.766158372, -5),
        (31, -14.766158372, -5),
    ]]
    fillet(fillet_1_edges, radius=FILLET_1_R)

    # 草图14 → 切除-拉伸6 (cut)
    with BuildSketch(Plane.XY.offset(5)):
        Circle(SKETCH_14_R)
    extrude(amount=-CUT_EXTRUDE_6_DEPTH, mode=Mode.SUBTRACT)


solid = part.part
